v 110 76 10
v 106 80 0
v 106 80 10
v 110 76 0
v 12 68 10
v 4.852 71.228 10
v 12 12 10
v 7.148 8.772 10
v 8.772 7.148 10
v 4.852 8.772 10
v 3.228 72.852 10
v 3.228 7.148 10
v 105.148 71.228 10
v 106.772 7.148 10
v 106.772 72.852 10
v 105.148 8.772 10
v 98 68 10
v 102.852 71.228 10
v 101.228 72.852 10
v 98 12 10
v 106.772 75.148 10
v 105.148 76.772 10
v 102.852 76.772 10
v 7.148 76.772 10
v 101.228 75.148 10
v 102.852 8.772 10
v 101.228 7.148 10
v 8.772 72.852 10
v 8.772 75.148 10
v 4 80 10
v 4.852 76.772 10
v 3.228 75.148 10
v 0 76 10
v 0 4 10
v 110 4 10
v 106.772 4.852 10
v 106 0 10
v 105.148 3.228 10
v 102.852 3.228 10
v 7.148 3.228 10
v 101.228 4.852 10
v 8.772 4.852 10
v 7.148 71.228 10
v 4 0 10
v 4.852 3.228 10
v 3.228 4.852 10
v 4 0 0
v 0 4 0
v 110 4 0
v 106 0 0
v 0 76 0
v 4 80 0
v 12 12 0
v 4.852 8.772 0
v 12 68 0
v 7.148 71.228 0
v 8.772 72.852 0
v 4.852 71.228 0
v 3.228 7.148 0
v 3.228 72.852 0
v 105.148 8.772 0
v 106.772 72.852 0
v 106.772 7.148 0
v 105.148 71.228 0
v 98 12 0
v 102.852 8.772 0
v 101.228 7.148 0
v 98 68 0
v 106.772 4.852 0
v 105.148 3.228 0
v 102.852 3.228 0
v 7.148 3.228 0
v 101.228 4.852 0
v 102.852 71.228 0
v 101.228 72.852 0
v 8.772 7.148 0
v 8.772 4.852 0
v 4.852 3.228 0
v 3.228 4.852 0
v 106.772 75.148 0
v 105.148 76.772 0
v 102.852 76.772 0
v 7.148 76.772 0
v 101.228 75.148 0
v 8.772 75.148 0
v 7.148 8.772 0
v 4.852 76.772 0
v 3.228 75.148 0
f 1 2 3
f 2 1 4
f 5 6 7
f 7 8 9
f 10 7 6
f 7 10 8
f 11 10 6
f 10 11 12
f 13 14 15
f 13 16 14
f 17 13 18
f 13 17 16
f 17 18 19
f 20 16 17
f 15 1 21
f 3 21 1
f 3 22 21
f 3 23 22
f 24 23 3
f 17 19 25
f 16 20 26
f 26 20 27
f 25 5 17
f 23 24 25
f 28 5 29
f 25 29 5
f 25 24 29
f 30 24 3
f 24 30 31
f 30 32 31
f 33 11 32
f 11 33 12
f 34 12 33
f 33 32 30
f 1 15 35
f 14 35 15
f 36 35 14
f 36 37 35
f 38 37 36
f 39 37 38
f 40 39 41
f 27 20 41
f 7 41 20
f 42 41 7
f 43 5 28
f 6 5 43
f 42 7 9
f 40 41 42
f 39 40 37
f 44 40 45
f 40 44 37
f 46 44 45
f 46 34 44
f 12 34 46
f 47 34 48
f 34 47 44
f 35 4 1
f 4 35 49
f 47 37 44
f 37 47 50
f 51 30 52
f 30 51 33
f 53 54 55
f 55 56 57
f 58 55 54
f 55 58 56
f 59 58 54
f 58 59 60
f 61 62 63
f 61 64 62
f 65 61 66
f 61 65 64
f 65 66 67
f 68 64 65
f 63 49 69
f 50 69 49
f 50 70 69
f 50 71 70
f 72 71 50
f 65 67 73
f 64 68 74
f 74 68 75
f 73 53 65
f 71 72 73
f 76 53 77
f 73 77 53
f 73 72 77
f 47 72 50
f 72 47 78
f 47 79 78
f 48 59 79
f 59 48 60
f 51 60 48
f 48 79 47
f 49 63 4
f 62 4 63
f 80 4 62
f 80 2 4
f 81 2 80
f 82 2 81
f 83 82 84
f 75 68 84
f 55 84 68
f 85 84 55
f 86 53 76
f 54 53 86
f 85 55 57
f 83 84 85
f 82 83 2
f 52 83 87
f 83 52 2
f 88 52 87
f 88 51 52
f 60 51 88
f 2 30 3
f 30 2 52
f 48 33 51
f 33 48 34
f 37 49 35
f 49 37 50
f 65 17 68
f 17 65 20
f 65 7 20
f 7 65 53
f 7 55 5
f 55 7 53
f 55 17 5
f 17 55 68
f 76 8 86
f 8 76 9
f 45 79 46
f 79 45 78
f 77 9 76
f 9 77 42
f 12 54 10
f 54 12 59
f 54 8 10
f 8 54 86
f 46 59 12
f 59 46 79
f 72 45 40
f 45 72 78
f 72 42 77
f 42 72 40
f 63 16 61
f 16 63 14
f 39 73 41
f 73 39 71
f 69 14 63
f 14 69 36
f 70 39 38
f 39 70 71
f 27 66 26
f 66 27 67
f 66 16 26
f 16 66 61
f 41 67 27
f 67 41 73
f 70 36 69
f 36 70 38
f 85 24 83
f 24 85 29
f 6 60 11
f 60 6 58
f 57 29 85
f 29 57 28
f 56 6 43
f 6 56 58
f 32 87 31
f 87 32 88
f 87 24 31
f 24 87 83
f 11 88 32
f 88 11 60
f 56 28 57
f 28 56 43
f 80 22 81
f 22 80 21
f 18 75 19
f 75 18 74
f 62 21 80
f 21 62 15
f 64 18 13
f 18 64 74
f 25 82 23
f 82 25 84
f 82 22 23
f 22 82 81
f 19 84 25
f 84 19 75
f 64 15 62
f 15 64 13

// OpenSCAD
$fn = 32;

// ----------------------------------------------------------------------
// Frame plate: 110 x 80 frame, 12 mm rails
// ----------------------------------------------------------------------

// --- parameters (mm) ---
plate_l = 110;            // plate length, X
plate_w = 80;             // plate width, Y
plate_t = 10;             // plate thickness, Z (extrusion height)
corner_c = 4;             // corner chamfer
frame_bar = 12;           // frame rail width
bolt_r = 3;               // corner bolt window radius
bolt_inset = 6;           // bolt centre inset from the edges
fit_tol = 0.02;           // declared fit tolerance (prompt contract)
free_tol = 0.2;           // declared free tolerance (prompt contract)

win_l = plate_l - 2 * frame_bar;  // window length
win_w = plate_w - 2 * frame_bar;  // window width
bolt_d = 2 * bolt_r;  // corner hole diameter

profile = [[4, 0], [106, 0], [110, 4], [110, 76], [106, 80], [4, 80], [0, 76], [0, 4]];  // primary outline, 8 points, counter clockwise
void_1 = [[12, 12], [98, 12], [98, 68], [12, 68]];  // the window, 4 points
void_2 = [[8.772, 7.148], [7.148, 8.772], [4.852, 8.772], [3.228, 7.148], [3.228, 4.852], [4.852, 3.228], [7.148, 3.228], [8.772, 4.852]];  // corner bolt window, 8 points
void_3 = [[106.772, 7.148], [105.148, 8.772], [102.852, 8.772], [101.228, 7.148], [101.228, 4.852], [102.852, 3.228], [105.148, 3.228], [106.772, 4.852]];  // corner bolt window, 8 points
void_4 = [[8.772, 75.148], [7.148, 76.772], [4.852, 76.772], [3.228, 75.148], [3.228, 72.852], [4.852, 71.228], [7.148, 71.228], [8.772, 72.852]];  // corner bolt window, 8 points
void_5 = [[106.772, 75.148], [105.148, 76.772], [102.852, 76.772], [101.228, 75.148], [101.228, 72.852], [102.852, 71.228], [105.148, 71.228], [106.772, 72.852]];  // corner bolt window, 8 points

// --- the one profile operation ---
difference() {
  linear_extrude(height = plate_t) polygon(points = profile);
  translate([0, 0, -1])
    linear_extrude(height = plate_t + 2) polygon(points = void_1);
  translate([0, 0, -1])
    linear_extrude(height = plate_t + 2) polygon(points = void_2);
  translate([0, 0, -1])
    linear_extrude(height = plate_t + 2) polygon(points = void_3);
  translate([0, 0, -1])
    linear_extrude(height = plate_t + 2) polygon(points = void_4);
  translate([0, 0, -1])
    linear_extrude(height = plate_t + 2) polygon(points = void_5);
}
